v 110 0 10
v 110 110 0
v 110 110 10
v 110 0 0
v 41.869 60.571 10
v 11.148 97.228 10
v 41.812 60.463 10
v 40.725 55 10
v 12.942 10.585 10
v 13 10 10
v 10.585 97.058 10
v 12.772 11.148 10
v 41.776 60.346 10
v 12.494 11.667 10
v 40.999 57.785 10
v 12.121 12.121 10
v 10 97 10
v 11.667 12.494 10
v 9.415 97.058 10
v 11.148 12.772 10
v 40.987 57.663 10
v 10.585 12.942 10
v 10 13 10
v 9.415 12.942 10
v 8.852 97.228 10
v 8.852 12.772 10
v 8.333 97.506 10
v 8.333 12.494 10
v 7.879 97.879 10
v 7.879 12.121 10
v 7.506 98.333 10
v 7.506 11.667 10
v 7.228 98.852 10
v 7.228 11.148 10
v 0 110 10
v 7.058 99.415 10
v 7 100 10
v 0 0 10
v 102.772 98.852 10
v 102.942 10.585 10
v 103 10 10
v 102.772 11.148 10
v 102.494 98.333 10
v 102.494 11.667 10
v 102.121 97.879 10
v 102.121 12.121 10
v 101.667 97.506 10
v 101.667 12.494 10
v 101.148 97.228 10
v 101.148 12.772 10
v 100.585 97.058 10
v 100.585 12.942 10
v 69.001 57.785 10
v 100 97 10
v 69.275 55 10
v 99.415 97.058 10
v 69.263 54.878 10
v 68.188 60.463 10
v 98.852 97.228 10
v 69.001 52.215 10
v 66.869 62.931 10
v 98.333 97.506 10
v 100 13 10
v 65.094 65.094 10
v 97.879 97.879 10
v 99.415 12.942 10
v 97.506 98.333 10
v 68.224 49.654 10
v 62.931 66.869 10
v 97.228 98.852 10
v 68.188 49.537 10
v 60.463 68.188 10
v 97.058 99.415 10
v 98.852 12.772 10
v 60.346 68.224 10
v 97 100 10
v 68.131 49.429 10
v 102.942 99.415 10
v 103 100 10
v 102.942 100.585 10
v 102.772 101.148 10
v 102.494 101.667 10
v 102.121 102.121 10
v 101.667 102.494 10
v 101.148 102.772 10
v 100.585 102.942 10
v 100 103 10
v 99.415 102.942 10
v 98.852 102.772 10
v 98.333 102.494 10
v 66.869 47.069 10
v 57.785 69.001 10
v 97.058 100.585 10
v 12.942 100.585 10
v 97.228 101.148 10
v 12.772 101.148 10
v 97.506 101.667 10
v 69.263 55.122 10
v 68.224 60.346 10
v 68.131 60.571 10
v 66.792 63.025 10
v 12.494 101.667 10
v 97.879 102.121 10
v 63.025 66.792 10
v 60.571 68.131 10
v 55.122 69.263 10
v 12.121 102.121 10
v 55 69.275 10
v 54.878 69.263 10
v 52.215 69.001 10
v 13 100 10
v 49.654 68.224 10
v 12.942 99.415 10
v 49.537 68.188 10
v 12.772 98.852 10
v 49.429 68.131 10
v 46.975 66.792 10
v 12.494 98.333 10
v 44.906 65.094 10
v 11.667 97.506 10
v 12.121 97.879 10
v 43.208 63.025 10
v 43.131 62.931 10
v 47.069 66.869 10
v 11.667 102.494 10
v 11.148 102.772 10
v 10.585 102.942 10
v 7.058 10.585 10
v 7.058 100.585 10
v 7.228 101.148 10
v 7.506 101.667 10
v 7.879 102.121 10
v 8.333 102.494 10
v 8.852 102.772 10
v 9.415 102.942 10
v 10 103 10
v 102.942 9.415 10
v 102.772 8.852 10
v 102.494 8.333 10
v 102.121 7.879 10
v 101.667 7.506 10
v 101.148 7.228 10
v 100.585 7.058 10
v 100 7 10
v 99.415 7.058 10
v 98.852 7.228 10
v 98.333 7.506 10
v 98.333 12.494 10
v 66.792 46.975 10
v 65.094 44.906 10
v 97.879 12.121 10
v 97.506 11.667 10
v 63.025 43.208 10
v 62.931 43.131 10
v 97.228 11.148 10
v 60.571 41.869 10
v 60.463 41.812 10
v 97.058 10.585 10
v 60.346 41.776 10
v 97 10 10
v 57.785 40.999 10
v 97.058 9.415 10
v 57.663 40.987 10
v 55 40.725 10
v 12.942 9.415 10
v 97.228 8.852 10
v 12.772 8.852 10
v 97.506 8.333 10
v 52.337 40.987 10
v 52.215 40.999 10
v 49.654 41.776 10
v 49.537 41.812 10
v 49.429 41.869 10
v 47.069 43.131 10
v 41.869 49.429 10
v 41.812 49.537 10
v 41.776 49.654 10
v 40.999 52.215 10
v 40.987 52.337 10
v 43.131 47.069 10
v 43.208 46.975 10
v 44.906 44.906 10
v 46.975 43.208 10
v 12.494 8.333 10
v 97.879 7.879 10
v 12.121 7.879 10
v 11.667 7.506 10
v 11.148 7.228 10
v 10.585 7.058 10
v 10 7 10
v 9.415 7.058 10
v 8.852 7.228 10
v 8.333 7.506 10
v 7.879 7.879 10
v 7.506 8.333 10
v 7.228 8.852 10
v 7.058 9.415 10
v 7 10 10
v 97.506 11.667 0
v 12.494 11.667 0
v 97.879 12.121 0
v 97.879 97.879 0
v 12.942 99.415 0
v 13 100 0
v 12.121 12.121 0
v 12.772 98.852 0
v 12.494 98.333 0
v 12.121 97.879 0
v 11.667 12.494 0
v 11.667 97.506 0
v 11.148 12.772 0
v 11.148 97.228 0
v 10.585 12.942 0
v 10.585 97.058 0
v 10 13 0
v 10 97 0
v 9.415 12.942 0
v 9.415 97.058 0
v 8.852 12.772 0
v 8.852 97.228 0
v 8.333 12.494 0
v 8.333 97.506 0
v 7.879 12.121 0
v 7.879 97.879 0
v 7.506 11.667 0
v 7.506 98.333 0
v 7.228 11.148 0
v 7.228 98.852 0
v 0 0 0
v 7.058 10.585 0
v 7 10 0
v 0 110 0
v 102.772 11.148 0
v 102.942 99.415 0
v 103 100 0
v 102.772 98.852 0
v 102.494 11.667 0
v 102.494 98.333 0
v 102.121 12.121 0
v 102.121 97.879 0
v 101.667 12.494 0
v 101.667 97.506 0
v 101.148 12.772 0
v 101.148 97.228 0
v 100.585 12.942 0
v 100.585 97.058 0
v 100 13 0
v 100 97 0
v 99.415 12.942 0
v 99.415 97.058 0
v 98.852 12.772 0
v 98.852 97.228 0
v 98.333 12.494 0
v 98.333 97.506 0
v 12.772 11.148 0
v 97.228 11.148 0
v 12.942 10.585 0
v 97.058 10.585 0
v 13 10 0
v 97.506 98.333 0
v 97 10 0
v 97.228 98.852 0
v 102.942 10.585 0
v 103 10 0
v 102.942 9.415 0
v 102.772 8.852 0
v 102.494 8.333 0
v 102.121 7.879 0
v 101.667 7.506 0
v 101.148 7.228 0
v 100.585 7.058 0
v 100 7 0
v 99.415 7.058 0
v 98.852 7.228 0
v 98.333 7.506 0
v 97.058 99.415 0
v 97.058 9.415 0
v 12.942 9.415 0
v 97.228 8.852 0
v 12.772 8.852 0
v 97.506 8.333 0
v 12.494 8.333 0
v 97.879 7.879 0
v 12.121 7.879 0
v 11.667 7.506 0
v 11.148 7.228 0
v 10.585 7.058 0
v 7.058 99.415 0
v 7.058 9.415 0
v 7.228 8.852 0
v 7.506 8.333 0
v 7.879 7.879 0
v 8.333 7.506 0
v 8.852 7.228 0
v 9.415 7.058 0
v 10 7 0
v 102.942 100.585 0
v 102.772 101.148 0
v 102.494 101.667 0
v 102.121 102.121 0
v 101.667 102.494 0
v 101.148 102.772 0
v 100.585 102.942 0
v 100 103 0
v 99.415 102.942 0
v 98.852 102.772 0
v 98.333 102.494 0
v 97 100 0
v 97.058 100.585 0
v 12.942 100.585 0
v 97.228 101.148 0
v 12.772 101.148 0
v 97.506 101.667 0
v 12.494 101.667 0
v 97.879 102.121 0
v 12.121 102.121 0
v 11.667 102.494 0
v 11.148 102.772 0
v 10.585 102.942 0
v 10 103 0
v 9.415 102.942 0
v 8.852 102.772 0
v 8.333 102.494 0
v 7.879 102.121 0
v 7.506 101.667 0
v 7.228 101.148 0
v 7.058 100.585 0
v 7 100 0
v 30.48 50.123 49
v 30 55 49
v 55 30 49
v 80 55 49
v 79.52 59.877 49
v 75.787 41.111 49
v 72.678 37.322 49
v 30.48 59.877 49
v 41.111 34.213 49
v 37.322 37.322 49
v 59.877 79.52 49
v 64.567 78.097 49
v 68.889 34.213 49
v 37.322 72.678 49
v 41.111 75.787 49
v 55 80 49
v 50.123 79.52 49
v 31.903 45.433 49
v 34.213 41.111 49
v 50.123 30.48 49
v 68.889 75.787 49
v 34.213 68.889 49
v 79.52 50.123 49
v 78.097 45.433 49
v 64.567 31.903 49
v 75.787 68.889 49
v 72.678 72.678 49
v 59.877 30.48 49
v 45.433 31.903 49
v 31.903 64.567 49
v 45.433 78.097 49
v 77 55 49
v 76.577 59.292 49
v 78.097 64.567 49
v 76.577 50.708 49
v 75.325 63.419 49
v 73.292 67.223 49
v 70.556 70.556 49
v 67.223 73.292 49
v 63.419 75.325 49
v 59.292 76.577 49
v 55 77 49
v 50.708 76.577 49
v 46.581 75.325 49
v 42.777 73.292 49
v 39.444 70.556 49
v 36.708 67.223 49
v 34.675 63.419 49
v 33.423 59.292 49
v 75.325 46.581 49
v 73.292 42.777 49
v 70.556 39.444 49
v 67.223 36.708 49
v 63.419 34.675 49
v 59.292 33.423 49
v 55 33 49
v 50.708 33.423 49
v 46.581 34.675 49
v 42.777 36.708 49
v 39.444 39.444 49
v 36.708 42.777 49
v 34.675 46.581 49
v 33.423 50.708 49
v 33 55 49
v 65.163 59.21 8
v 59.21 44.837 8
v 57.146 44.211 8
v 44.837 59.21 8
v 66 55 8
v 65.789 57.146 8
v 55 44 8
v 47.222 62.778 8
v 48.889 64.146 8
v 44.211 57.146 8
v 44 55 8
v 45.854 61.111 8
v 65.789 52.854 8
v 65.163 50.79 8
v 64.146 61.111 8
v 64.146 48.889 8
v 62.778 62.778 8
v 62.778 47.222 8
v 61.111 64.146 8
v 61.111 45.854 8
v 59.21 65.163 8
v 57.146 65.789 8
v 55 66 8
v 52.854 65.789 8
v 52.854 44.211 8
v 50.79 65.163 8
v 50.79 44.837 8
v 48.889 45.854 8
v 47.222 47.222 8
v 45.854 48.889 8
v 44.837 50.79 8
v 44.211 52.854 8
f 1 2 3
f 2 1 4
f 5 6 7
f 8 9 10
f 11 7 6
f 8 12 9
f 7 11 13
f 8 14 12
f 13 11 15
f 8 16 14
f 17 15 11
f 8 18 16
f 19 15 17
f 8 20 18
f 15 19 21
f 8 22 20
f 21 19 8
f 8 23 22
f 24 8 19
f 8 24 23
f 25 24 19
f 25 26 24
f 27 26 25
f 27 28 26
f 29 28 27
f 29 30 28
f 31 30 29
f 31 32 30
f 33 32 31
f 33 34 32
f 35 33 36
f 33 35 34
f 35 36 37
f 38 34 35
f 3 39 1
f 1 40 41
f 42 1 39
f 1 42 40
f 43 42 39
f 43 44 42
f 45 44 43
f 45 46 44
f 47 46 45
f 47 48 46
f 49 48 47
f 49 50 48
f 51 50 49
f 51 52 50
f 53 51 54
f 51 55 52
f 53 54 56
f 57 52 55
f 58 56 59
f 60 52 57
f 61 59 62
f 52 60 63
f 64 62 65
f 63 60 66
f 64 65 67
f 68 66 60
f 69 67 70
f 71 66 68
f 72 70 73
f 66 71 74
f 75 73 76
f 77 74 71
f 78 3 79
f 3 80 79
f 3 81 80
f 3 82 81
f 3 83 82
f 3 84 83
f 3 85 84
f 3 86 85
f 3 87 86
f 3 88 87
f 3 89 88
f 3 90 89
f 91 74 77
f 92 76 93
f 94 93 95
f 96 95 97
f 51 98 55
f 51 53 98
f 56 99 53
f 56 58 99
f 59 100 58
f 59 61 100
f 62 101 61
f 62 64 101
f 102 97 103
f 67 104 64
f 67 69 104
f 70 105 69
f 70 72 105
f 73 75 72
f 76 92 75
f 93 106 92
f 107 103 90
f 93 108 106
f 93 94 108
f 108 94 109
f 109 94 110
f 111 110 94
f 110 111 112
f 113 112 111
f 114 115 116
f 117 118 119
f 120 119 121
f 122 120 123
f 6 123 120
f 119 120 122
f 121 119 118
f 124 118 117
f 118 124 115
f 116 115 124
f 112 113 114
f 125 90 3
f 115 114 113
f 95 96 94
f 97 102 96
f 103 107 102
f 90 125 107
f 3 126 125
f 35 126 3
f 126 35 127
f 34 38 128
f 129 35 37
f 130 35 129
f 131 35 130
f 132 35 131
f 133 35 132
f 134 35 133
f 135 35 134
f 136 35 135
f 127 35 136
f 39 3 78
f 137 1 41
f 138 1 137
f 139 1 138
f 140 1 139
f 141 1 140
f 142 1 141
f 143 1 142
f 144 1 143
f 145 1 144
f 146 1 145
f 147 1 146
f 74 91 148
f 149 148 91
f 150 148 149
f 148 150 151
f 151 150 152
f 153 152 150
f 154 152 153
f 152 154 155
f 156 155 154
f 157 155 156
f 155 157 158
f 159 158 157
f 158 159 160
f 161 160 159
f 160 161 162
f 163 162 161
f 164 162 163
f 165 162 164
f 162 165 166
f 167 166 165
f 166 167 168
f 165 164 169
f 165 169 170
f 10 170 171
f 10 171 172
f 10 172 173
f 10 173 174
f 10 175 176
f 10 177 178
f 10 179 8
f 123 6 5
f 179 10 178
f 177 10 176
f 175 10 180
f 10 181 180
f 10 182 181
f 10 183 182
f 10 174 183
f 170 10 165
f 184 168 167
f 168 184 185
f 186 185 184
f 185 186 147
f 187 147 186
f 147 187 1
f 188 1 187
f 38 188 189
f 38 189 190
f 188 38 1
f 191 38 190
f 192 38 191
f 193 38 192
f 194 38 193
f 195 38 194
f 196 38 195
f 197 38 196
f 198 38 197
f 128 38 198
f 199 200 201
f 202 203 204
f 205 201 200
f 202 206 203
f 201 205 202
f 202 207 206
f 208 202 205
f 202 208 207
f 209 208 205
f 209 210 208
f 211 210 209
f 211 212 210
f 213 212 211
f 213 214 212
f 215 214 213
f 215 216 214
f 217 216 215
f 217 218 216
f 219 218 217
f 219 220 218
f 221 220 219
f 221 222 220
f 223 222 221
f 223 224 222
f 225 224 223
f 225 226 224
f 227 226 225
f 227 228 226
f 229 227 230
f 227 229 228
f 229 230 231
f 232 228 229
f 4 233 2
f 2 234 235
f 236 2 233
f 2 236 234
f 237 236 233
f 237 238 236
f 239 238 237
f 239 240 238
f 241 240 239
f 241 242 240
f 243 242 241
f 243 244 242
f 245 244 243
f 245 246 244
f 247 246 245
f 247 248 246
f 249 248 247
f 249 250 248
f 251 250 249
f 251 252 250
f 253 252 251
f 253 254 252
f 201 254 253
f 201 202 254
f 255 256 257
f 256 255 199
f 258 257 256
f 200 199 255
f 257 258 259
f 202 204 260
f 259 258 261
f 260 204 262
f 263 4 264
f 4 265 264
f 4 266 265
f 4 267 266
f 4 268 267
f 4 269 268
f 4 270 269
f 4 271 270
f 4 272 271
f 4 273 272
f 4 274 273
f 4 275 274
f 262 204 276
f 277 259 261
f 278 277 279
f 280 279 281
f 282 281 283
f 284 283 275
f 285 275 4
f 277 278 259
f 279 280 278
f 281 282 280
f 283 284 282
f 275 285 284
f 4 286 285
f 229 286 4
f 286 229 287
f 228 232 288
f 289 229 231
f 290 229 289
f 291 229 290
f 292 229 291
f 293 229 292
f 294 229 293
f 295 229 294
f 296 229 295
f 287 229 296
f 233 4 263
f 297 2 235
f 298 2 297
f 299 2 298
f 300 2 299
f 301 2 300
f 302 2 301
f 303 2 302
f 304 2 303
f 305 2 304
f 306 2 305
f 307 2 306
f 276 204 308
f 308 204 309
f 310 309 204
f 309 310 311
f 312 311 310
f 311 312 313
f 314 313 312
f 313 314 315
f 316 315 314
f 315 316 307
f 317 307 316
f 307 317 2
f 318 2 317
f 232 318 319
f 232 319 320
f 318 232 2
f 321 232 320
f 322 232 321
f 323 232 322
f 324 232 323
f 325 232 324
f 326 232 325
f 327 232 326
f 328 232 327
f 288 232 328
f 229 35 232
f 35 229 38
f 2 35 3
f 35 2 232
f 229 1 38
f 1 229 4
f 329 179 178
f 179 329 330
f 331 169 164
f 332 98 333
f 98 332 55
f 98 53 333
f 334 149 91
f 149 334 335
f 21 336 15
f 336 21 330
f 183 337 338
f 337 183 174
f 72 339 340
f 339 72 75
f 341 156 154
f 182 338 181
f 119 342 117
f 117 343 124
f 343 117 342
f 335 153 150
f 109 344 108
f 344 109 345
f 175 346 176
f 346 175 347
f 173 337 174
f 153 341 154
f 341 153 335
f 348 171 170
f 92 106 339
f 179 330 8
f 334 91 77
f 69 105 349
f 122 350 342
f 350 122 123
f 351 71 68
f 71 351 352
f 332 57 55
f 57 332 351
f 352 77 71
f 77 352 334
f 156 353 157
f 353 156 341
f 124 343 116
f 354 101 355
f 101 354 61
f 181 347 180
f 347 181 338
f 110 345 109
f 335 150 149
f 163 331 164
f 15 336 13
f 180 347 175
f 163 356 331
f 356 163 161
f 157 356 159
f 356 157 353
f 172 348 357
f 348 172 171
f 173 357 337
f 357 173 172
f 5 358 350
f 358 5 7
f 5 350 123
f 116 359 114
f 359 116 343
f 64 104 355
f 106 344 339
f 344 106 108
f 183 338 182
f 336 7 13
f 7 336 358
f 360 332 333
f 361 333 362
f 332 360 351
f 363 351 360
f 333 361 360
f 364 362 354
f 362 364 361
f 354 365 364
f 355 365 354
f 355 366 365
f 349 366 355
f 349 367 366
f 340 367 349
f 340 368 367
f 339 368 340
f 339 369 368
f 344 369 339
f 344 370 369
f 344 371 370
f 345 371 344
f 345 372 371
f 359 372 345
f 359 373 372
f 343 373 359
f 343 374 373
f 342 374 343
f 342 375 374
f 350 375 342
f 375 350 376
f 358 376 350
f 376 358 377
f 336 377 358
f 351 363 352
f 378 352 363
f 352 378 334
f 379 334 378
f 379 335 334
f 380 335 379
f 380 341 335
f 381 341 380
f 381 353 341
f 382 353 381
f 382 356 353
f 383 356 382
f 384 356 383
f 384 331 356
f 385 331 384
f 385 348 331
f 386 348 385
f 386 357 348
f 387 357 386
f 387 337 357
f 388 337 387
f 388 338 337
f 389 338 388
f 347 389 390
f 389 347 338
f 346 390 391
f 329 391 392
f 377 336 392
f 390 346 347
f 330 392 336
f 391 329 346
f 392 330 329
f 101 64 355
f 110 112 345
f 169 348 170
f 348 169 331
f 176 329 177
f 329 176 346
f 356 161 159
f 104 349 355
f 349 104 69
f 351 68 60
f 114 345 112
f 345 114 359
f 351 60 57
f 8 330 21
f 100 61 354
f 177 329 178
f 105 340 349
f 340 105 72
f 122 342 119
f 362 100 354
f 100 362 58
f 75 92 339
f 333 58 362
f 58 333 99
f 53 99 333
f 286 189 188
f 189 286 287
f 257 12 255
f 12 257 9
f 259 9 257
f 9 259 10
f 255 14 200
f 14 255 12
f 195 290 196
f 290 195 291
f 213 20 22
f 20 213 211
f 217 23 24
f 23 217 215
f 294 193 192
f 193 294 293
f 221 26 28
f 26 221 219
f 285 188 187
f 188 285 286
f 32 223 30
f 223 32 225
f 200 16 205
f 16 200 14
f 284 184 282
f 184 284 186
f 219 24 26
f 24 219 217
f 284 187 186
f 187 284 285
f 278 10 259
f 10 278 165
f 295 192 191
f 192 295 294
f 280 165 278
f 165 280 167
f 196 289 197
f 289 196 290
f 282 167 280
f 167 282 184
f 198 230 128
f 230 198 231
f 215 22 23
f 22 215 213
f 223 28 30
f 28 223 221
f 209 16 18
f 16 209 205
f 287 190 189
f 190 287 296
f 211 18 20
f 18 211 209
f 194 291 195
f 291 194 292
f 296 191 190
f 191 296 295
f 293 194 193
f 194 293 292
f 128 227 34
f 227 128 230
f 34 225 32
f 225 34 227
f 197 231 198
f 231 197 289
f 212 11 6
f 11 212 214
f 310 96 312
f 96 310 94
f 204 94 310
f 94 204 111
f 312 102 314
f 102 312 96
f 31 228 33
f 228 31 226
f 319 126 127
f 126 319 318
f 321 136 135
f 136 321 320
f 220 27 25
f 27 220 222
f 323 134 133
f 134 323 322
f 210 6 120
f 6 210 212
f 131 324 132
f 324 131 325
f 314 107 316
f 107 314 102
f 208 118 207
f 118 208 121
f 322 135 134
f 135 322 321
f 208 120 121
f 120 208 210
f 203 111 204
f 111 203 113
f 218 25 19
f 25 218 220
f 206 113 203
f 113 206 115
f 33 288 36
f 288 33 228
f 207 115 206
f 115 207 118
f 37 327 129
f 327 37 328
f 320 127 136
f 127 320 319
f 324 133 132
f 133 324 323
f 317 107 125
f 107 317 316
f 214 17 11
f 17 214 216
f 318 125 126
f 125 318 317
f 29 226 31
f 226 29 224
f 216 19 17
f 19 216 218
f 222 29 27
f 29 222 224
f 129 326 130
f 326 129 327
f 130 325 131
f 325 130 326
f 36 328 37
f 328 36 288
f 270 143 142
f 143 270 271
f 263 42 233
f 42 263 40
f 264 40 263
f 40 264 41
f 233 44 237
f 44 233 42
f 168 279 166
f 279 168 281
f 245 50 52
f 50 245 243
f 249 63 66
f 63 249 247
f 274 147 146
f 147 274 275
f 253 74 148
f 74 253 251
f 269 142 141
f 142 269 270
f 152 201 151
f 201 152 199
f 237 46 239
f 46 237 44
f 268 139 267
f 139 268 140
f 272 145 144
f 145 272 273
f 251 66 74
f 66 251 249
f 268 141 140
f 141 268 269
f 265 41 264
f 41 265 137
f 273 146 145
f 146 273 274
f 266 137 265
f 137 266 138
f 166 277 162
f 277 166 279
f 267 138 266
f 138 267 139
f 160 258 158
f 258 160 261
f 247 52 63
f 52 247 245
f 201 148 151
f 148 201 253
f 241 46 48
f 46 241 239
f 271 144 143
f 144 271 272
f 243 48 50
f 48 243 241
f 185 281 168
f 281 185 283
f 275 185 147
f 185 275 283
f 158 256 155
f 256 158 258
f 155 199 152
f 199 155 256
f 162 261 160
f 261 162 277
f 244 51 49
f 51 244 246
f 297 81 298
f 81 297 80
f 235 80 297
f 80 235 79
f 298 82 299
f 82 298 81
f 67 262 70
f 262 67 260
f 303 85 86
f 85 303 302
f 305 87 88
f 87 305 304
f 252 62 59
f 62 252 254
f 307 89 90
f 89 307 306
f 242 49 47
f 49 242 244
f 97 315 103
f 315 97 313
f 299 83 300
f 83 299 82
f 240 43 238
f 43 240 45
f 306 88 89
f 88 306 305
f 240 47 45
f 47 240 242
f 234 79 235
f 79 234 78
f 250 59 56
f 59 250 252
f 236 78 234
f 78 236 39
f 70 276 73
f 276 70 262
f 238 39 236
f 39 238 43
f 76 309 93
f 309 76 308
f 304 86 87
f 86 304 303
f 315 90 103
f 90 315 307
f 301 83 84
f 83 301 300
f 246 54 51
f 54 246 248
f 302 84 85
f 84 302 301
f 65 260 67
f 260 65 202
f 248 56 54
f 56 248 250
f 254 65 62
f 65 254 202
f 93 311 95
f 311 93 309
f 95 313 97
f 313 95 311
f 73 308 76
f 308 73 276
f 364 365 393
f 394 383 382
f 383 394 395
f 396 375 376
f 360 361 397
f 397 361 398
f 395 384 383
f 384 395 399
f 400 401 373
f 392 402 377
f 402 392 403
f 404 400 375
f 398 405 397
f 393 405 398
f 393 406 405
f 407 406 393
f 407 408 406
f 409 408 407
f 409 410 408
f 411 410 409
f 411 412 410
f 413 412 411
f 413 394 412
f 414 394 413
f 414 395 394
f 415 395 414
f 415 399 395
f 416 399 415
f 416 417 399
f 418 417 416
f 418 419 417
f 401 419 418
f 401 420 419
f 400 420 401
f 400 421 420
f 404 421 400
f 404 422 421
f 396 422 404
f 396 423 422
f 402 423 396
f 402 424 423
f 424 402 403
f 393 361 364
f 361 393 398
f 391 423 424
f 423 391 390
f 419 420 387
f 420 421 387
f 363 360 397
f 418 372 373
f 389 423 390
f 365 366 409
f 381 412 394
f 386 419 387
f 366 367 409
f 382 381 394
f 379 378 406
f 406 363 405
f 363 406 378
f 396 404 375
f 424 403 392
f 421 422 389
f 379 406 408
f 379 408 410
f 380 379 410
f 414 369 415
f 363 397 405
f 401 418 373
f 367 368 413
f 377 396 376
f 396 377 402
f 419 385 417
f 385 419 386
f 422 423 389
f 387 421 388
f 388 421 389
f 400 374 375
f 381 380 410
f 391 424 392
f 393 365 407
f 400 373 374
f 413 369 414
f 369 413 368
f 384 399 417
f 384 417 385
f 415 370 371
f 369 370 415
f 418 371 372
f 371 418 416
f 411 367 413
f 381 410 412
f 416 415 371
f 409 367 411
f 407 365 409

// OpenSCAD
$fn = 32;

// ----------------------------------------------------------------------
// Hopper: flanged with square flange
// ----------------------------------------------------------------------

// --- parameters (mm) ---
fl = 110;                 // flange side, X and Y
fl_t = 10;                // flange thickness
cone_h = 40;              // cone height above the flange
top_d = 50;               // cone mouth diameter
bot_d = 28;               // cone spout diameter
wall = 3;                 // cone wall thickness
hole_r = 3;               // flange hole radius
hole_in = 10;             // hole inset from the corners

bore_d = bot_d - 2 * wall;  // spout bore diameter
total_h = fl_t + cone_h - 1;  // overall height

difference() {
  union() {
    cube([fl, fl, fl_t]);
    translate([fl / 2, fl / 2, fl_t - 1])
      cylinder(h = cone_h, d1 = bot_d, d2 = top_d);
  }
  translate([fl / 2, fl / 2, fl_t - 2])
    cylinder(h = cone_h + 1, d1 = bore_d, d2 = top_d - 2 * wall);
  for (sx = [0, 1], sy = [0, 1])
    translate([sx ? fl - hole_in : hole_in,
               sy ? fl - hole_in : hole_in, -1])
      cylinder(r = hole_r, h = fl_t + 2);
}
